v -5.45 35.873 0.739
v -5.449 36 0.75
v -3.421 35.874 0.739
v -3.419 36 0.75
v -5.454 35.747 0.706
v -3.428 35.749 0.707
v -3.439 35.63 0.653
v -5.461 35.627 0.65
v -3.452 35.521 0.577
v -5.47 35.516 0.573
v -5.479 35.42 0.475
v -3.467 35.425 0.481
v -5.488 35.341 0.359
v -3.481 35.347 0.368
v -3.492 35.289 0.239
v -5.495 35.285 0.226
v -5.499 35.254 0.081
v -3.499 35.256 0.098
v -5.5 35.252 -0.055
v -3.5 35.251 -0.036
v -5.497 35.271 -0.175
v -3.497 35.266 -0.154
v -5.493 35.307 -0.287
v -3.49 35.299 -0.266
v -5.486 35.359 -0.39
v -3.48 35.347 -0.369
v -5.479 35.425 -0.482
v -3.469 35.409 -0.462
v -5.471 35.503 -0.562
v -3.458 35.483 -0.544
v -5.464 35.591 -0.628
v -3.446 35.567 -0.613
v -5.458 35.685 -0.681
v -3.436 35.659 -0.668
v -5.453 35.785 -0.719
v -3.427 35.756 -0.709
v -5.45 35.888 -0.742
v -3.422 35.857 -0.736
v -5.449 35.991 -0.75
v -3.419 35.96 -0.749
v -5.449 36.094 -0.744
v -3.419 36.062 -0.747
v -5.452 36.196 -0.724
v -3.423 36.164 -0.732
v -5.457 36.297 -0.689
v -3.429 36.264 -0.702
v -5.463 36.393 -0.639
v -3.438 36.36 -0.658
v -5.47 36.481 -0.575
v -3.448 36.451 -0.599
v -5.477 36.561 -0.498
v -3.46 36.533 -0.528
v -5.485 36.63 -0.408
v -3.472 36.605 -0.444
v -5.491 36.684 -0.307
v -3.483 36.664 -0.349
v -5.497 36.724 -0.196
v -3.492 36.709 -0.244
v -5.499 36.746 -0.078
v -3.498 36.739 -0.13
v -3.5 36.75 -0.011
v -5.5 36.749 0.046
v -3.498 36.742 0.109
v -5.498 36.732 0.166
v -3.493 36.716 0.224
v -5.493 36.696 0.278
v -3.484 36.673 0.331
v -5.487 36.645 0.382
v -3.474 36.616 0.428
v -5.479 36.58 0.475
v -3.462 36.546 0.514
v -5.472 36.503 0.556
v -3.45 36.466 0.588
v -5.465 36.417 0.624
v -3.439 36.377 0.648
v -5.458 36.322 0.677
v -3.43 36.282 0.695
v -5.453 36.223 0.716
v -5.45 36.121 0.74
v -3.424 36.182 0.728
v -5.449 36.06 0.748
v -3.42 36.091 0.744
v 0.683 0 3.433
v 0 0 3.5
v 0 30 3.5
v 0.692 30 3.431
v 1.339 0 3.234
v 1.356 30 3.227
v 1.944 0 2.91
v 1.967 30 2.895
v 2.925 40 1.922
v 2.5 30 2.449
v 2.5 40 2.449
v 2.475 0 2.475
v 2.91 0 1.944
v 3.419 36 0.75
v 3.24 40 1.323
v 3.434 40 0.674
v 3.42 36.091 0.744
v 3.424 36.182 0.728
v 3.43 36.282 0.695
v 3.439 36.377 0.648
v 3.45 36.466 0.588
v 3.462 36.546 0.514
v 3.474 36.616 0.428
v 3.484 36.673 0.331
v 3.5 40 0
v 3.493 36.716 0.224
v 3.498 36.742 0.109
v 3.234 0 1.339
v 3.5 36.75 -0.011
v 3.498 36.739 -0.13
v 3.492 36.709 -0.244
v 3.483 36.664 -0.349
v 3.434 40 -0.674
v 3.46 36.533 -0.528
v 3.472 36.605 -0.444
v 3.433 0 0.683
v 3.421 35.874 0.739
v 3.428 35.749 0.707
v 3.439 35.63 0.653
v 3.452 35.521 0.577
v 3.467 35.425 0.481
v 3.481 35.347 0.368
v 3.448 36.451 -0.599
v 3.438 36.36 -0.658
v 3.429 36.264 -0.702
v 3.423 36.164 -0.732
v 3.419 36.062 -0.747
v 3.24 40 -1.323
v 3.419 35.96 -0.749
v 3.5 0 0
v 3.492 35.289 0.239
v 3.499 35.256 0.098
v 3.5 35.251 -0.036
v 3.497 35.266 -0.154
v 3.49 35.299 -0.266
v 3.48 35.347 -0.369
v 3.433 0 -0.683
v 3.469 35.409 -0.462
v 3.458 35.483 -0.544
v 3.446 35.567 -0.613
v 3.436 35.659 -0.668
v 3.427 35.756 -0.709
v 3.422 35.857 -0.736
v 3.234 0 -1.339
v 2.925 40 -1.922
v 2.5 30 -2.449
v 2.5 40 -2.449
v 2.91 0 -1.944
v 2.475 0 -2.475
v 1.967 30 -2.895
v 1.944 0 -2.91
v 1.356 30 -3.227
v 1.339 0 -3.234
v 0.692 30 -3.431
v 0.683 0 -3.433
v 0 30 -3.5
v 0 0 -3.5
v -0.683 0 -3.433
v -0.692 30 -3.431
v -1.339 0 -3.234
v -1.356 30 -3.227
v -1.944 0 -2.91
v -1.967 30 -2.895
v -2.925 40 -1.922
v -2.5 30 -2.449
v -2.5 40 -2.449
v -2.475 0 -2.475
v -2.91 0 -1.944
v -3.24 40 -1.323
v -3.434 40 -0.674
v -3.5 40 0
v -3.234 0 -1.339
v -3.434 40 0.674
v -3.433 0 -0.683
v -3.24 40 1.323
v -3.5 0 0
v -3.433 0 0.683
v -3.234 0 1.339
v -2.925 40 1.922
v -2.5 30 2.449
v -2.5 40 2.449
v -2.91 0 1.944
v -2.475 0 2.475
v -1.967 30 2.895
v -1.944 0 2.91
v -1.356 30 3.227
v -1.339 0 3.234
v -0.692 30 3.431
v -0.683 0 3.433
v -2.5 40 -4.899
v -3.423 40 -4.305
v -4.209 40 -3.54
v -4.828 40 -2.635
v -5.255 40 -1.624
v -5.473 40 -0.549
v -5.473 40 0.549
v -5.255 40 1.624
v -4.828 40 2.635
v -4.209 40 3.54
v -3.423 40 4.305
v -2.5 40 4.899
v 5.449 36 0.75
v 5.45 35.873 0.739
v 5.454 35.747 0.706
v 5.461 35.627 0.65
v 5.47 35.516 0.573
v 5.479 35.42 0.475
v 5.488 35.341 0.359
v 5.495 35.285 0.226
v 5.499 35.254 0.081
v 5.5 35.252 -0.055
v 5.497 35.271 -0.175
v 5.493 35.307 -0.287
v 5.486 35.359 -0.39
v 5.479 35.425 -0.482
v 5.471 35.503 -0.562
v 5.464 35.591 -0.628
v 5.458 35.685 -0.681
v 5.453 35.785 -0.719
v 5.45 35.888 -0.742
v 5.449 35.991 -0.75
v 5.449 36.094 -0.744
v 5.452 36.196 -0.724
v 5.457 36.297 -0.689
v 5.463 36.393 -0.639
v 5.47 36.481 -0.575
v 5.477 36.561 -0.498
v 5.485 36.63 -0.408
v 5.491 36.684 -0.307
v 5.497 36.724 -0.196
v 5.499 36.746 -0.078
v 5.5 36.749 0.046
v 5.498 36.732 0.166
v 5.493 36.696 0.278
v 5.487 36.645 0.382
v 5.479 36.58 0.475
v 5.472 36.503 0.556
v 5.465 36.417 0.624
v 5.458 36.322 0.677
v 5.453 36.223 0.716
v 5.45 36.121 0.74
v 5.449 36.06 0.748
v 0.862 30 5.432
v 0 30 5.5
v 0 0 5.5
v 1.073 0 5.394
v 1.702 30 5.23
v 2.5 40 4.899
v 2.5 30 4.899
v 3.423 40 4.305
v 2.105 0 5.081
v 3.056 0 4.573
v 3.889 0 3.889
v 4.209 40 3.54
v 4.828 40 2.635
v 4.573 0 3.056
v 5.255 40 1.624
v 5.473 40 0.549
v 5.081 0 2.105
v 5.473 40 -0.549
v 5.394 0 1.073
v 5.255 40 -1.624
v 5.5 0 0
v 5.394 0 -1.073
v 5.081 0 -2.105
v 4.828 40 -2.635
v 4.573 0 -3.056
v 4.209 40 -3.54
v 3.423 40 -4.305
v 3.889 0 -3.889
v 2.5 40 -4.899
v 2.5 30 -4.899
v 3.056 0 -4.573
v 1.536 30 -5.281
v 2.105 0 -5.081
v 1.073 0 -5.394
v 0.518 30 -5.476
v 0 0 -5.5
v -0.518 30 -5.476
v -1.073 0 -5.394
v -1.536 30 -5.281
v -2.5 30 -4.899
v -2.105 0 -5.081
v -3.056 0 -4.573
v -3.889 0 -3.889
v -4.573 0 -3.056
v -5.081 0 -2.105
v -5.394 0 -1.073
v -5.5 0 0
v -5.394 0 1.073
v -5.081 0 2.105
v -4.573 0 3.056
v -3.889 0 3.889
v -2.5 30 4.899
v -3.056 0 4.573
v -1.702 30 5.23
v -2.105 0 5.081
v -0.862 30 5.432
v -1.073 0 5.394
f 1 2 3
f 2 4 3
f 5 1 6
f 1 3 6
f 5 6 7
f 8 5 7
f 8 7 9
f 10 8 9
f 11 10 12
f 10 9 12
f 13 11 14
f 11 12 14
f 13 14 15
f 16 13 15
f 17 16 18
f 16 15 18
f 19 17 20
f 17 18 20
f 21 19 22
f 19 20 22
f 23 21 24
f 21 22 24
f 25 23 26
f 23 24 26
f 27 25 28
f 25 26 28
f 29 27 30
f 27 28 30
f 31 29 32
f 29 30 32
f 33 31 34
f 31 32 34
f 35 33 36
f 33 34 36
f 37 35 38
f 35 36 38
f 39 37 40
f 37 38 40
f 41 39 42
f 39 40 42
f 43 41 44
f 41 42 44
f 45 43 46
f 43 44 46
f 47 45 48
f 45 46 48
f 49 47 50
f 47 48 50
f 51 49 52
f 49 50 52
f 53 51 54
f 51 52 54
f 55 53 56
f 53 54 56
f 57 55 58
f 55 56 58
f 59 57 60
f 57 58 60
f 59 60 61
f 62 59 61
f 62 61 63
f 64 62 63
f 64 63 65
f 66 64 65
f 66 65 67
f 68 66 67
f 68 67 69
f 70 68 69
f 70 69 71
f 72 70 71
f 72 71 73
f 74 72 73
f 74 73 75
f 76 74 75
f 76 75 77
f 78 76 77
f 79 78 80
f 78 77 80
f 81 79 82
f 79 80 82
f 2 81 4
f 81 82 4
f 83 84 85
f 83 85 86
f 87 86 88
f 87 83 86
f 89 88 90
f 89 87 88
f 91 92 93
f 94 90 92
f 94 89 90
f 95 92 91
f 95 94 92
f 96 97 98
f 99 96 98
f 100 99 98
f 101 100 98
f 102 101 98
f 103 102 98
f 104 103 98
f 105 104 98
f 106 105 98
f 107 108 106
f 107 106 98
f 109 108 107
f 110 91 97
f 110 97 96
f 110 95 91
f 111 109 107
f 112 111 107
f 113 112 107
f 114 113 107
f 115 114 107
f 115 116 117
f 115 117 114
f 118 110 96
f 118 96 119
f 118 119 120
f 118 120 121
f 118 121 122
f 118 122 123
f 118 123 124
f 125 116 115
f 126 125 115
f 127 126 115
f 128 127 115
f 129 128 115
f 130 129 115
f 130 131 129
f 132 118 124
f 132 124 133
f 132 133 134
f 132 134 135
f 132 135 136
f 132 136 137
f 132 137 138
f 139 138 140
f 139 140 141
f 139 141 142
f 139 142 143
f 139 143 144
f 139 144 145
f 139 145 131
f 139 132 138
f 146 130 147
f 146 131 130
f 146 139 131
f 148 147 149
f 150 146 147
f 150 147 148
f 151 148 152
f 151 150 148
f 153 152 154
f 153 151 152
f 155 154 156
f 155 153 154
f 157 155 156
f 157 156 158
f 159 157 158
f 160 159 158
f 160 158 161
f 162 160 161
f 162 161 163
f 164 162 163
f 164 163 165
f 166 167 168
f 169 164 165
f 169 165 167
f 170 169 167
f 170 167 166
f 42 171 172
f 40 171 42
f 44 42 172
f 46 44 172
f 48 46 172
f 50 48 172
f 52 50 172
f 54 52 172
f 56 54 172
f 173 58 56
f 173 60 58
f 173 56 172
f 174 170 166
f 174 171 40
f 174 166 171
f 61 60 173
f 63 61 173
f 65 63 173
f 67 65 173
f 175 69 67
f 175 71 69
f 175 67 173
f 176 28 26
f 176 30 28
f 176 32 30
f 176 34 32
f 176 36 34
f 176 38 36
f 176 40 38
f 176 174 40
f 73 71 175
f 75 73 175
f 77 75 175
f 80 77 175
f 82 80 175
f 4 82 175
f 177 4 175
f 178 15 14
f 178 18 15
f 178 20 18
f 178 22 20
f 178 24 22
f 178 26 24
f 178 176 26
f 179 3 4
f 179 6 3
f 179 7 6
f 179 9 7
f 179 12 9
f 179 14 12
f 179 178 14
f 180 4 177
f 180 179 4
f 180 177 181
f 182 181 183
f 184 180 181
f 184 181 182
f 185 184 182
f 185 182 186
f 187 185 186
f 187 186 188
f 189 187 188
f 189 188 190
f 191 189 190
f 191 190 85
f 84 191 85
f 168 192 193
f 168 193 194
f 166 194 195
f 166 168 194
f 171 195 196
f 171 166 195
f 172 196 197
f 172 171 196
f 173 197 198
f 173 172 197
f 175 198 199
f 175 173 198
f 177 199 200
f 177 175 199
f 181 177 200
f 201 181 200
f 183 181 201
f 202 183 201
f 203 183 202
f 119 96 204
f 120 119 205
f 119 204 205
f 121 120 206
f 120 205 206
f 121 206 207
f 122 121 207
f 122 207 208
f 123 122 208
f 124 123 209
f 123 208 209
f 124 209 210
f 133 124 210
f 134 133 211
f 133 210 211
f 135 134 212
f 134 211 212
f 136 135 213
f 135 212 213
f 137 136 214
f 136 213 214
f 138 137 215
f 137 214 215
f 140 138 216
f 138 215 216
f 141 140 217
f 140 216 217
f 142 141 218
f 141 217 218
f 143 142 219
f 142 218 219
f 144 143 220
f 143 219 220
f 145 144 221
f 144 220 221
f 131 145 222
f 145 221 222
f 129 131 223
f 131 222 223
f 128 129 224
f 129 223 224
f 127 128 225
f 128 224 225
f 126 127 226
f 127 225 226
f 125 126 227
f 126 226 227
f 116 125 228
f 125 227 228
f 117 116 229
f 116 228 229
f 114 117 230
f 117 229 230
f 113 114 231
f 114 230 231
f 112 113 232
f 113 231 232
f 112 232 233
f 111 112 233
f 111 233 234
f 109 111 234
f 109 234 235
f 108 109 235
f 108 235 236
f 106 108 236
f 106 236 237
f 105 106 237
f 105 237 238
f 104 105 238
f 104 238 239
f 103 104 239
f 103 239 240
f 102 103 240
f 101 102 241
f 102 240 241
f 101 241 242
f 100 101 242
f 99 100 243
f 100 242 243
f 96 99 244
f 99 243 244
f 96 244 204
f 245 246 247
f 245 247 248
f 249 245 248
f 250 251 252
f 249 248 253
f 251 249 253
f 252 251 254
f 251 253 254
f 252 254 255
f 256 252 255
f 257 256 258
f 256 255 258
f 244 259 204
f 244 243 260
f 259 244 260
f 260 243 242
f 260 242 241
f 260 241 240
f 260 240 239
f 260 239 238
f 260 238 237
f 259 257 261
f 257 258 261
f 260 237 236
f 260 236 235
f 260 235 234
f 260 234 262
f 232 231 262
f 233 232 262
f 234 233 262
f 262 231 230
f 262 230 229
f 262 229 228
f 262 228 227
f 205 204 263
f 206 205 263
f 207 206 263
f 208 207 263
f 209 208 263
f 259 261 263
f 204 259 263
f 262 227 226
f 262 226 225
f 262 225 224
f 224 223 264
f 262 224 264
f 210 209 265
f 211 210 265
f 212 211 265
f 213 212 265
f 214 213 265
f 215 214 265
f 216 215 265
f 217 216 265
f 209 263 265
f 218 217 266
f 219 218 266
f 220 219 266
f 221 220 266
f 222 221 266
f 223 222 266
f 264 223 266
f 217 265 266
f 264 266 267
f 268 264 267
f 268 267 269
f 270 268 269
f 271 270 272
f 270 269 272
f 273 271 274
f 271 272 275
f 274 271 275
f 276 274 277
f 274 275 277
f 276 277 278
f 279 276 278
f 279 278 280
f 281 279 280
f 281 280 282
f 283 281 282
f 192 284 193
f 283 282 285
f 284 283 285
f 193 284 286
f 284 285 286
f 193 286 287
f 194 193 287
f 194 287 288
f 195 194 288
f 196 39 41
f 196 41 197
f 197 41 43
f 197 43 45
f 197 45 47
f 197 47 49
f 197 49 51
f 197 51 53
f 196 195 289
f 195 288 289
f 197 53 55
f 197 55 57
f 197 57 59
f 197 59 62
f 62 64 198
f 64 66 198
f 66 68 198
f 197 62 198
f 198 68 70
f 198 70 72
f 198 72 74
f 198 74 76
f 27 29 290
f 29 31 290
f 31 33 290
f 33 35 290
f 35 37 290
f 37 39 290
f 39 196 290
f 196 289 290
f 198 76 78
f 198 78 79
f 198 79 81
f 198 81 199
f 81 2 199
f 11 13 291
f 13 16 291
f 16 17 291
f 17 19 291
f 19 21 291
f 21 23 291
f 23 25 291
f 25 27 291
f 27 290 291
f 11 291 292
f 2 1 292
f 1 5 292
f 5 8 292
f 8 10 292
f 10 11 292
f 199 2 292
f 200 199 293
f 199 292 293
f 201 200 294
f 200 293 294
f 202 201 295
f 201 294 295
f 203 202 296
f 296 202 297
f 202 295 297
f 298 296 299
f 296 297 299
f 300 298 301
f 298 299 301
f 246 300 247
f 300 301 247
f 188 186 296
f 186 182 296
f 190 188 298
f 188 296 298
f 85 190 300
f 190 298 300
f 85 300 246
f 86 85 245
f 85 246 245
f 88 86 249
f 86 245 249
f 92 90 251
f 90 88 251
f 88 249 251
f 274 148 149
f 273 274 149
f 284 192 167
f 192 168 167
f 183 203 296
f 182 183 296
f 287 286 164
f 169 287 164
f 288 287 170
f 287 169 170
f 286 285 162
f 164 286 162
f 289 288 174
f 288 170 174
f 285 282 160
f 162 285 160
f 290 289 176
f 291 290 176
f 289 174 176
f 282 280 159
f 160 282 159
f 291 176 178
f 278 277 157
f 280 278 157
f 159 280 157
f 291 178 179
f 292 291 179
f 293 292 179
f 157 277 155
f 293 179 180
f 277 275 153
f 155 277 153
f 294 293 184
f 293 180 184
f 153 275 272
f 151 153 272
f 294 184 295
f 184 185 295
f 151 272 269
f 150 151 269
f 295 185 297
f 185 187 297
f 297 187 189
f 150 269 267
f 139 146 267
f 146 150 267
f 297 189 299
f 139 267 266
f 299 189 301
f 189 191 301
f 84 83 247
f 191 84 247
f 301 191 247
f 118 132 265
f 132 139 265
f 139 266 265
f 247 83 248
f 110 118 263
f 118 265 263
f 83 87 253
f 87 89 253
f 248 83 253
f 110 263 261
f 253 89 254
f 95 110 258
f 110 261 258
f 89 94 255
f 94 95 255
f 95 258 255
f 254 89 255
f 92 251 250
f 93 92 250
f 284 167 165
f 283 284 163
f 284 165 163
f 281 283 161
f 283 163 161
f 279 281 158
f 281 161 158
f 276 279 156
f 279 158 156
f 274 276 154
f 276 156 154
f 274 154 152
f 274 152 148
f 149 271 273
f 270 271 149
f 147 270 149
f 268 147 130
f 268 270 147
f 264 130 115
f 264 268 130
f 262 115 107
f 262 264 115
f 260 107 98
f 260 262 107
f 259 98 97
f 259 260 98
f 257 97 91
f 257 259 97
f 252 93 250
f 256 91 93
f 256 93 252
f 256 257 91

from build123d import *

# Parameters (mm, degrees)
SKETCH1_R           = 5.5
SKETCH1_R_2         = 3.5
BOSS_EXTRUDE1_DEPTH = 40
SKETCH2_W           = 5
SKETCH2_H           = 10
CUT_EXTRUDE1_DEPTH  = 20
SKETCH3_R           = 0.75
CUT_EXTRUDE2_DEPTH  = 10


with BuildPart() as part:
    # Sketch1 → Boss-Extrude1 (new body)
    with BuildSketch(Plane(origin=(0, 0, 0), x_dir=(1, 0, 0), z_dir=(0, 1, 0))):
        with Locations(Location((0, 0, 0), (0, 0, 270))):
            Circle(SKETCH1_R)
        with Locations(Location((0, 0, 0), (0, 0, 270))):
            Circle(SKETCH1_R_2, mode=Mode.SUBTRACT)
    extrude(amount=BOSS_EXTRUDE1_DEPTH)

    # Sketch2 → Cut-Extrude1 (cut, symmetric)
    with BuildSketch(Plane.XY):
        with Locations((0, 35)):
            Rectangle(SKETCH2_W, SKETCH2_H)
        with Locations((0, 45)):
            Rectangle(SKETCH2_W, SKETCH2_H)
    extrude(amount=CUT_EXTRUDE1_DEPTH, both=True, mode=Mode.SUBTRACT)

    # Sketch3 → Cut-Extrude2 (cut, symmetric)
    with BuildSketch(Plane(origin=(0, 0, 0), x_dir=(0, 0, -1), z_dir=(1, 0, 0))):
        with Locations(Location((0, 36, 0), (0, 0, 180))):
            Circle(SKETCH3_R)
    extrude(amount=CUT_EXTRUDE2_DEPTH, both=True, mode=Mode.SUBTRACT)


solid = part.part
